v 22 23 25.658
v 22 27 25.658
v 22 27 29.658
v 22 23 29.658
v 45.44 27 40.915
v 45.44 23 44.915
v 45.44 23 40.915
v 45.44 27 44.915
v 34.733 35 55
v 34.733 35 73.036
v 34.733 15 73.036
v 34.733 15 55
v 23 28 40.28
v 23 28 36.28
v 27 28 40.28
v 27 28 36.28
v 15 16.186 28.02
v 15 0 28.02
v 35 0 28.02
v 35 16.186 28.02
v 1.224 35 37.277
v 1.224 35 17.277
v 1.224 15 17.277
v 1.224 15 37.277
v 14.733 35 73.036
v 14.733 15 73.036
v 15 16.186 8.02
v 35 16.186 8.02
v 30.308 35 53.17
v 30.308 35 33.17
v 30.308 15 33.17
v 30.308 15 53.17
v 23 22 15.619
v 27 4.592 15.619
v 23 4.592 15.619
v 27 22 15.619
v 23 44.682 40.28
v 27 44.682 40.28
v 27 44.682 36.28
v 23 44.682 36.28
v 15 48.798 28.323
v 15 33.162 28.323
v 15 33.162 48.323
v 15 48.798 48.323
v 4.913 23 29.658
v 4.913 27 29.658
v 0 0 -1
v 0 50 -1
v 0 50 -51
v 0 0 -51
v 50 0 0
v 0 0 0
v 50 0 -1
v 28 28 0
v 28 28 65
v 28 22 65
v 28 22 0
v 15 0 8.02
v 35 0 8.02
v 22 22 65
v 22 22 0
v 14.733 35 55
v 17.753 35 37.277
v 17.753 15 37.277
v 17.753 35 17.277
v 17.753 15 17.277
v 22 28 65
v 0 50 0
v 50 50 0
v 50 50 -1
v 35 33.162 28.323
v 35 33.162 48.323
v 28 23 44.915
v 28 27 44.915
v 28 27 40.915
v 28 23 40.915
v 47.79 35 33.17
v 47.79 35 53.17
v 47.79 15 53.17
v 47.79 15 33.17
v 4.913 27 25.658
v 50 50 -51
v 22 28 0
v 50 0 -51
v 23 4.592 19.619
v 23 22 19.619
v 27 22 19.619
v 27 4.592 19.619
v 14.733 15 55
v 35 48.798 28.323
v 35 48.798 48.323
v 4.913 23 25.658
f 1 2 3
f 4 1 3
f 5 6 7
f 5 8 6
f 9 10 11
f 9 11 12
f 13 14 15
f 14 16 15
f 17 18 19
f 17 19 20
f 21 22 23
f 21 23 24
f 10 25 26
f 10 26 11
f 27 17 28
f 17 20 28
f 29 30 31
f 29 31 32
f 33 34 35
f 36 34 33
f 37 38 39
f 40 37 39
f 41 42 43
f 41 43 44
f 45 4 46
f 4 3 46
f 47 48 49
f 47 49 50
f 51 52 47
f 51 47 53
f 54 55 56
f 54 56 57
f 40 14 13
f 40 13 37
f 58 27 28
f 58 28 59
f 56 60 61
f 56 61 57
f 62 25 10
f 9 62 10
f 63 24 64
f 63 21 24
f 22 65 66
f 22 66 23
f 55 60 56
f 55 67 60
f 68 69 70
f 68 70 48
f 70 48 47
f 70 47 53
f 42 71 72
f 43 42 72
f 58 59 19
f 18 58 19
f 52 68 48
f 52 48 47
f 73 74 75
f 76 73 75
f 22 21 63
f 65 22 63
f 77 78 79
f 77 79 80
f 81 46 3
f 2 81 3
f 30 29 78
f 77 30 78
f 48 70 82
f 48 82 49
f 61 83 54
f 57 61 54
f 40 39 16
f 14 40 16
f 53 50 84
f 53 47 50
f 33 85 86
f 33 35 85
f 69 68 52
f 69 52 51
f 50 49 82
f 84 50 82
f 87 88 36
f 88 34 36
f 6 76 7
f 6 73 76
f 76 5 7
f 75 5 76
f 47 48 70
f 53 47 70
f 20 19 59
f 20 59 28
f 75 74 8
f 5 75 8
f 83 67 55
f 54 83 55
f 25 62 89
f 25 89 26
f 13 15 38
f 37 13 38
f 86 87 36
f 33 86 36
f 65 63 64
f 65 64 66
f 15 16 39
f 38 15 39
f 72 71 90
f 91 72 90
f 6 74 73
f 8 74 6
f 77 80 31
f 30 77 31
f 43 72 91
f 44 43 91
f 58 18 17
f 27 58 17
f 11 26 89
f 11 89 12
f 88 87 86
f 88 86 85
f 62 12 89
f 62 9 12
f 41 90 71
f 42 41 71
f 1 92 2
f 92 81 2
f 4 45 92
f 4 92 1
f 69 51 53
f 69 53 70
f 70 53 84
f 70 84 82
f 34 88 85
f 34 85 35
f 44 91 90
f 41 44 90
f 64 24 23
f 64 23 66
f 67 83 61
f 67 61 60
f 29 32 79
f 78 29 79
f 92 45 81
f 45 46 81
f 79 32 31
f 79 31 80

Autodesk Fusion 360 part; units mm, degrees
sketch "Skizze1" plane through (0, 0, 0) normal (0, 0, 1) x (1, 0, 0)
  line L0 (0, 0) -> (50, 0)
  line L1 (50, 0) -> (50, 50)
  line L2 (50, 50) -> (0, 50)
  line L3 (0, 50) -> (0, 0)
  line L4 (0, 25) -> (50, 25) construction
  line L5 (25, 50) -> (25, 0) construction
extrude "Extrusion1" add sketch "Skizze1" against normal blind 1 makes body 1 in component "Ground"
ref_plane "Arbeitsebene1" through (25, 25, 0) normal (0, -1, 0) x (1, 0, 0)
ref_plane "Arbeitsebene2" through (25, 25, 0) normal (-1, 0, 0) x (0, -1, 0)
sketch "Skizze2" plane through (25, 25, 0) normal (0, -1, 0) x (1, 0, 0)
  line L0 (-25, 0) -> (25, 0)
  line L1 (0, 0) -> (0, 75) construction
  line L2 (-3, 0) -> (-3, 65)
  line L3 (-3, 65) -> (3, 65)
  line L4 (3, 65) -> (3, 0)
  line L5 (-3, 0) -> (3, 0)
  line L6 (-3, 29.6581) -> (-20.0867, 29.6581)
  line L7 (-20.0867, 29.6581) -> (-20.0867, 25.6581)
  line L8 (-20.0867, 25.6581) -> (-3, 25.6581)
  line L9 (-3, 25.6581) -> (-3, 29.6581)
  line L10 (3, 44.9151) -> (20.4397, 44.9151)
  line L11 (20.4397, 44.9151) -> (20.4397, 40.9151)
  line L12 (20.4397, 40.9151) -> (3, 40.9151)
  line L13 (3, 40.9151) -> (3, 44.9151)
  line L14 (-23.7757, 37.2774) -> (-7.2473, 37.2774)
  line L15 (-7.2473, 37.2774) -> (-7.2473, 17.2774)
  line L16 (-7.2473, 17.2774) -> (-23.7757, 17.2774)
  line L17 (-23.7757, 17.2774) -> (-23.7757, 37.2774)
  line L18 (5.3079, 53.1701) -> (22.7898, 53.1701)
  line L19 (22.7898, 53.1701) -> (22.7898, 33.1701)
  line L20 (22.7898, 33.1701) -> (5.3079, 33.1701)
  line L21 (5.3079, 33.1701) -> (5.3079, 53.1701)
  line L22 (-10.267, 73.036) -> (9.733, 73.036)
  line L23 (9.733, 73.036) -> (9.733, 55)
  line L24 (9.733, 55) -> (-10.267, 55)
  line L25 (-10.267, 55) -> (-10.267, 73.036)
  dimension "d21" = 6
  dimension "d25" = 3
  dimension "d26" = 4
  dimension "d27" = 4
  dimension "d36" = 20
  dimension "d37" = 20
  dimension "d38" = 20
extrude "Extrusion1'" add sketch "Skizze2" along normal mid plane 6 separate body contours L0 L2 L4 L5 L9 L13 L24 | L2 L3 L4 L24 makes body 2 in component "Trunk"
sketch "Skizze3" plane through (25, 25, 0) normal (-1, 0, 0) x (0, 1, 0)
  line L0 (3, -65) -> (-3, -65)
  line L1 (-3, -65) -> (-3, 0)
  line L2 (-3, 0) -> (3, 0)
  line L3 (3, 0) -> (3, -65)
  line L4 (0, -44.9151) -> (0, -40.9151)
  line L5 (0, -29.6581) -> (0, -25.6581)
  line L6 (3, -40.2798) -> (19.6821, -40.2798)
  line L7 (19.6821, -40.2798) -> (19.6821, -36.2798)
  line L8 (19.6821, -36.2798) -> (3, -36.2798)
  line L9 (3, -36.2798) -> (3, -40.2798)
  line L10 (-3, -19.6193) -> (-20.4076, -19.6193)
  line L11 (-20.4076, -19.6193) -> (-20.4076, -15.6193)
  line L12 (-20.4076, -15.6193) -> (-3, -15.6193)
  line L13 (-3, -15.6193) -> (-3, -19.6193)
  line L14 (8.1625, -48.3226) -> (23.7982, -48.3226)
  line L15 (23.7982, -48.3226) -> (23.7982, -28.3226)
  line L16 (23.7982, -28.3226) -> (8.1625, -28.3226)
  line L17 (8.1625, -28.3226) -> (8.1625, -48.3226)
  line L18 (-25, -28.0196) -> (-8.8142, -28.0196)
  line L19 (-8.8142, -28.0196) -> (-8.8142, -8.0196)
  line L20 (-8.8142, -8.0196) -> (-25, -8.0196)
  line L21 (-25, -8.0196) -> (-25, -28.0196)
  line L22 (-20.4076, -17.6193) -> (-3, -17.6193) construction
  line L23 (3, -38.2798) -> (19.6821, -38.2798) construction
  dimension "d32" = 4
  dimension "d33" = 4
  dimension "d34" = 20
  dimension "d35" = 20
extrude "Extrusion1''" add sketch "Skizze3" along normal mid plane 4 separate body contours L3 L6 L8 L9 L17 | L1 L10 L12 L13 L19 | L6 L7 L8 L17 | L10 L11 L12 L19 makes body 3 at (24.3333, 10.395, 19.6193) makes body 4 at (23, 39.1214, 38.9465) in component "Branches Y"
extrude "Extrusion1'''" add sketch "Skizze2" along normal mid plane 4 separate body contours L2 L6 L8 L9 L15 | L4 L10 L12 L13 L21 | L6 L7 L8 L15 | L10 L11 L12 L21 makes body 5 at (10.6089, 24.3333, 25.6581) makes body 6 at (33.8132, 23, 42.2484) in component "Branches X"
extrude "Extrusion1''''" add sketch "Skizze2" along normal mid plane 20 separate body contours L6 L7 L8 L14 L15 L16 L17 | L6 L7 L8 L15 | L10 L11 L12 L21 | L10 L11 L12 L18 L19 L20 L21 | L2 L3 L4 L22 L23 L24 L25 | L2 L3 L4 L24 makes body 7 at (1.2243, 28.3333, 23.9441) makes body 8 at (30.3079, 28.3333, 39.8368) makes body 9 at (21.3997, 21.6667, 73.036) in component "Leaf X"
extrude "Extrusion1'''''" add sketch "Skizze3" along normal mid plane 20 separate body contours L6 L7 L8 L17 | L6 L7 L8 L14 L15 L16 L17 | L10 L11 L12 L18 L19 L20 L21 | L10 L11 L12 L19 makes body 10 at (28.3333, 16.1858, 21.3529) makes body 11 at (21.6667, 33.1625, 41.656) in component "Leaf Y"
extrude "Extrusion1''''''" add 1 faces at (16.6667, 33.3333, -1) along direction (0, 0, -1) blind 50 separate body on bodies 1 makes body 12 in component "Ground below "
component "Ground" placed x (1, 0, 0) y (0, 1, 0) z (0, 0, 1) at (0, 0, 0)
component "Trunk" placed x (1, 0, 0) y (0, 1, 0) z (0, 0, 1) at (0, 0, 0)
component "Branches Y" placed x (1, 0, 0) y (0, 1, 0) z (0, 0, 1) at (0, 0, 0)
component "Branches X" placed x (1, 0, 0) y (0, 1, 0) z (0, 0, 1) at (0, 0, 0)
component "Leaf X" placed x (1, 0, 0) y (0, 1, 0) z (0, 0, 1) at (0, 0, 0)
component "Leaf Y" placed x (1, 0, 0) y (0, 1, 0) z (0, 0, 1) at (0, 0, 0)
component "Ground below " placed x (1, 0, 0) y (0, 1, 0) z (0, 0, 1) at (0, 0, 0)
equation "d21 = d_trunk"
equation "d_trunk = 6 mm" comment "Diameter Treetrunk"
equation "d_branch = 4 mm" comment "Diameter tree branch"
equation "d_leaf = 20 mm" comment "diameter leafball"
equation "d25 = d21 / 2"
equation "d26 = d_branch"
equation "d27 = d_branch"
equation "d30 = d_trunk / 2"
equation "d32 = d_branch"
equation "d33 = d_branch"
equation "d34 = d_leaf"
equation "d35 = d_leaf"
equation "d36 = d_leaf"
equation "d37 = d_leaf"
equation "d38 = d_leaf"
equation "d39 = d_branch / 2"
equation "d41 = d_branch / 2"
equation "d43 = d_leaf / 2"
equation "d45 = d_leaf / 2"
